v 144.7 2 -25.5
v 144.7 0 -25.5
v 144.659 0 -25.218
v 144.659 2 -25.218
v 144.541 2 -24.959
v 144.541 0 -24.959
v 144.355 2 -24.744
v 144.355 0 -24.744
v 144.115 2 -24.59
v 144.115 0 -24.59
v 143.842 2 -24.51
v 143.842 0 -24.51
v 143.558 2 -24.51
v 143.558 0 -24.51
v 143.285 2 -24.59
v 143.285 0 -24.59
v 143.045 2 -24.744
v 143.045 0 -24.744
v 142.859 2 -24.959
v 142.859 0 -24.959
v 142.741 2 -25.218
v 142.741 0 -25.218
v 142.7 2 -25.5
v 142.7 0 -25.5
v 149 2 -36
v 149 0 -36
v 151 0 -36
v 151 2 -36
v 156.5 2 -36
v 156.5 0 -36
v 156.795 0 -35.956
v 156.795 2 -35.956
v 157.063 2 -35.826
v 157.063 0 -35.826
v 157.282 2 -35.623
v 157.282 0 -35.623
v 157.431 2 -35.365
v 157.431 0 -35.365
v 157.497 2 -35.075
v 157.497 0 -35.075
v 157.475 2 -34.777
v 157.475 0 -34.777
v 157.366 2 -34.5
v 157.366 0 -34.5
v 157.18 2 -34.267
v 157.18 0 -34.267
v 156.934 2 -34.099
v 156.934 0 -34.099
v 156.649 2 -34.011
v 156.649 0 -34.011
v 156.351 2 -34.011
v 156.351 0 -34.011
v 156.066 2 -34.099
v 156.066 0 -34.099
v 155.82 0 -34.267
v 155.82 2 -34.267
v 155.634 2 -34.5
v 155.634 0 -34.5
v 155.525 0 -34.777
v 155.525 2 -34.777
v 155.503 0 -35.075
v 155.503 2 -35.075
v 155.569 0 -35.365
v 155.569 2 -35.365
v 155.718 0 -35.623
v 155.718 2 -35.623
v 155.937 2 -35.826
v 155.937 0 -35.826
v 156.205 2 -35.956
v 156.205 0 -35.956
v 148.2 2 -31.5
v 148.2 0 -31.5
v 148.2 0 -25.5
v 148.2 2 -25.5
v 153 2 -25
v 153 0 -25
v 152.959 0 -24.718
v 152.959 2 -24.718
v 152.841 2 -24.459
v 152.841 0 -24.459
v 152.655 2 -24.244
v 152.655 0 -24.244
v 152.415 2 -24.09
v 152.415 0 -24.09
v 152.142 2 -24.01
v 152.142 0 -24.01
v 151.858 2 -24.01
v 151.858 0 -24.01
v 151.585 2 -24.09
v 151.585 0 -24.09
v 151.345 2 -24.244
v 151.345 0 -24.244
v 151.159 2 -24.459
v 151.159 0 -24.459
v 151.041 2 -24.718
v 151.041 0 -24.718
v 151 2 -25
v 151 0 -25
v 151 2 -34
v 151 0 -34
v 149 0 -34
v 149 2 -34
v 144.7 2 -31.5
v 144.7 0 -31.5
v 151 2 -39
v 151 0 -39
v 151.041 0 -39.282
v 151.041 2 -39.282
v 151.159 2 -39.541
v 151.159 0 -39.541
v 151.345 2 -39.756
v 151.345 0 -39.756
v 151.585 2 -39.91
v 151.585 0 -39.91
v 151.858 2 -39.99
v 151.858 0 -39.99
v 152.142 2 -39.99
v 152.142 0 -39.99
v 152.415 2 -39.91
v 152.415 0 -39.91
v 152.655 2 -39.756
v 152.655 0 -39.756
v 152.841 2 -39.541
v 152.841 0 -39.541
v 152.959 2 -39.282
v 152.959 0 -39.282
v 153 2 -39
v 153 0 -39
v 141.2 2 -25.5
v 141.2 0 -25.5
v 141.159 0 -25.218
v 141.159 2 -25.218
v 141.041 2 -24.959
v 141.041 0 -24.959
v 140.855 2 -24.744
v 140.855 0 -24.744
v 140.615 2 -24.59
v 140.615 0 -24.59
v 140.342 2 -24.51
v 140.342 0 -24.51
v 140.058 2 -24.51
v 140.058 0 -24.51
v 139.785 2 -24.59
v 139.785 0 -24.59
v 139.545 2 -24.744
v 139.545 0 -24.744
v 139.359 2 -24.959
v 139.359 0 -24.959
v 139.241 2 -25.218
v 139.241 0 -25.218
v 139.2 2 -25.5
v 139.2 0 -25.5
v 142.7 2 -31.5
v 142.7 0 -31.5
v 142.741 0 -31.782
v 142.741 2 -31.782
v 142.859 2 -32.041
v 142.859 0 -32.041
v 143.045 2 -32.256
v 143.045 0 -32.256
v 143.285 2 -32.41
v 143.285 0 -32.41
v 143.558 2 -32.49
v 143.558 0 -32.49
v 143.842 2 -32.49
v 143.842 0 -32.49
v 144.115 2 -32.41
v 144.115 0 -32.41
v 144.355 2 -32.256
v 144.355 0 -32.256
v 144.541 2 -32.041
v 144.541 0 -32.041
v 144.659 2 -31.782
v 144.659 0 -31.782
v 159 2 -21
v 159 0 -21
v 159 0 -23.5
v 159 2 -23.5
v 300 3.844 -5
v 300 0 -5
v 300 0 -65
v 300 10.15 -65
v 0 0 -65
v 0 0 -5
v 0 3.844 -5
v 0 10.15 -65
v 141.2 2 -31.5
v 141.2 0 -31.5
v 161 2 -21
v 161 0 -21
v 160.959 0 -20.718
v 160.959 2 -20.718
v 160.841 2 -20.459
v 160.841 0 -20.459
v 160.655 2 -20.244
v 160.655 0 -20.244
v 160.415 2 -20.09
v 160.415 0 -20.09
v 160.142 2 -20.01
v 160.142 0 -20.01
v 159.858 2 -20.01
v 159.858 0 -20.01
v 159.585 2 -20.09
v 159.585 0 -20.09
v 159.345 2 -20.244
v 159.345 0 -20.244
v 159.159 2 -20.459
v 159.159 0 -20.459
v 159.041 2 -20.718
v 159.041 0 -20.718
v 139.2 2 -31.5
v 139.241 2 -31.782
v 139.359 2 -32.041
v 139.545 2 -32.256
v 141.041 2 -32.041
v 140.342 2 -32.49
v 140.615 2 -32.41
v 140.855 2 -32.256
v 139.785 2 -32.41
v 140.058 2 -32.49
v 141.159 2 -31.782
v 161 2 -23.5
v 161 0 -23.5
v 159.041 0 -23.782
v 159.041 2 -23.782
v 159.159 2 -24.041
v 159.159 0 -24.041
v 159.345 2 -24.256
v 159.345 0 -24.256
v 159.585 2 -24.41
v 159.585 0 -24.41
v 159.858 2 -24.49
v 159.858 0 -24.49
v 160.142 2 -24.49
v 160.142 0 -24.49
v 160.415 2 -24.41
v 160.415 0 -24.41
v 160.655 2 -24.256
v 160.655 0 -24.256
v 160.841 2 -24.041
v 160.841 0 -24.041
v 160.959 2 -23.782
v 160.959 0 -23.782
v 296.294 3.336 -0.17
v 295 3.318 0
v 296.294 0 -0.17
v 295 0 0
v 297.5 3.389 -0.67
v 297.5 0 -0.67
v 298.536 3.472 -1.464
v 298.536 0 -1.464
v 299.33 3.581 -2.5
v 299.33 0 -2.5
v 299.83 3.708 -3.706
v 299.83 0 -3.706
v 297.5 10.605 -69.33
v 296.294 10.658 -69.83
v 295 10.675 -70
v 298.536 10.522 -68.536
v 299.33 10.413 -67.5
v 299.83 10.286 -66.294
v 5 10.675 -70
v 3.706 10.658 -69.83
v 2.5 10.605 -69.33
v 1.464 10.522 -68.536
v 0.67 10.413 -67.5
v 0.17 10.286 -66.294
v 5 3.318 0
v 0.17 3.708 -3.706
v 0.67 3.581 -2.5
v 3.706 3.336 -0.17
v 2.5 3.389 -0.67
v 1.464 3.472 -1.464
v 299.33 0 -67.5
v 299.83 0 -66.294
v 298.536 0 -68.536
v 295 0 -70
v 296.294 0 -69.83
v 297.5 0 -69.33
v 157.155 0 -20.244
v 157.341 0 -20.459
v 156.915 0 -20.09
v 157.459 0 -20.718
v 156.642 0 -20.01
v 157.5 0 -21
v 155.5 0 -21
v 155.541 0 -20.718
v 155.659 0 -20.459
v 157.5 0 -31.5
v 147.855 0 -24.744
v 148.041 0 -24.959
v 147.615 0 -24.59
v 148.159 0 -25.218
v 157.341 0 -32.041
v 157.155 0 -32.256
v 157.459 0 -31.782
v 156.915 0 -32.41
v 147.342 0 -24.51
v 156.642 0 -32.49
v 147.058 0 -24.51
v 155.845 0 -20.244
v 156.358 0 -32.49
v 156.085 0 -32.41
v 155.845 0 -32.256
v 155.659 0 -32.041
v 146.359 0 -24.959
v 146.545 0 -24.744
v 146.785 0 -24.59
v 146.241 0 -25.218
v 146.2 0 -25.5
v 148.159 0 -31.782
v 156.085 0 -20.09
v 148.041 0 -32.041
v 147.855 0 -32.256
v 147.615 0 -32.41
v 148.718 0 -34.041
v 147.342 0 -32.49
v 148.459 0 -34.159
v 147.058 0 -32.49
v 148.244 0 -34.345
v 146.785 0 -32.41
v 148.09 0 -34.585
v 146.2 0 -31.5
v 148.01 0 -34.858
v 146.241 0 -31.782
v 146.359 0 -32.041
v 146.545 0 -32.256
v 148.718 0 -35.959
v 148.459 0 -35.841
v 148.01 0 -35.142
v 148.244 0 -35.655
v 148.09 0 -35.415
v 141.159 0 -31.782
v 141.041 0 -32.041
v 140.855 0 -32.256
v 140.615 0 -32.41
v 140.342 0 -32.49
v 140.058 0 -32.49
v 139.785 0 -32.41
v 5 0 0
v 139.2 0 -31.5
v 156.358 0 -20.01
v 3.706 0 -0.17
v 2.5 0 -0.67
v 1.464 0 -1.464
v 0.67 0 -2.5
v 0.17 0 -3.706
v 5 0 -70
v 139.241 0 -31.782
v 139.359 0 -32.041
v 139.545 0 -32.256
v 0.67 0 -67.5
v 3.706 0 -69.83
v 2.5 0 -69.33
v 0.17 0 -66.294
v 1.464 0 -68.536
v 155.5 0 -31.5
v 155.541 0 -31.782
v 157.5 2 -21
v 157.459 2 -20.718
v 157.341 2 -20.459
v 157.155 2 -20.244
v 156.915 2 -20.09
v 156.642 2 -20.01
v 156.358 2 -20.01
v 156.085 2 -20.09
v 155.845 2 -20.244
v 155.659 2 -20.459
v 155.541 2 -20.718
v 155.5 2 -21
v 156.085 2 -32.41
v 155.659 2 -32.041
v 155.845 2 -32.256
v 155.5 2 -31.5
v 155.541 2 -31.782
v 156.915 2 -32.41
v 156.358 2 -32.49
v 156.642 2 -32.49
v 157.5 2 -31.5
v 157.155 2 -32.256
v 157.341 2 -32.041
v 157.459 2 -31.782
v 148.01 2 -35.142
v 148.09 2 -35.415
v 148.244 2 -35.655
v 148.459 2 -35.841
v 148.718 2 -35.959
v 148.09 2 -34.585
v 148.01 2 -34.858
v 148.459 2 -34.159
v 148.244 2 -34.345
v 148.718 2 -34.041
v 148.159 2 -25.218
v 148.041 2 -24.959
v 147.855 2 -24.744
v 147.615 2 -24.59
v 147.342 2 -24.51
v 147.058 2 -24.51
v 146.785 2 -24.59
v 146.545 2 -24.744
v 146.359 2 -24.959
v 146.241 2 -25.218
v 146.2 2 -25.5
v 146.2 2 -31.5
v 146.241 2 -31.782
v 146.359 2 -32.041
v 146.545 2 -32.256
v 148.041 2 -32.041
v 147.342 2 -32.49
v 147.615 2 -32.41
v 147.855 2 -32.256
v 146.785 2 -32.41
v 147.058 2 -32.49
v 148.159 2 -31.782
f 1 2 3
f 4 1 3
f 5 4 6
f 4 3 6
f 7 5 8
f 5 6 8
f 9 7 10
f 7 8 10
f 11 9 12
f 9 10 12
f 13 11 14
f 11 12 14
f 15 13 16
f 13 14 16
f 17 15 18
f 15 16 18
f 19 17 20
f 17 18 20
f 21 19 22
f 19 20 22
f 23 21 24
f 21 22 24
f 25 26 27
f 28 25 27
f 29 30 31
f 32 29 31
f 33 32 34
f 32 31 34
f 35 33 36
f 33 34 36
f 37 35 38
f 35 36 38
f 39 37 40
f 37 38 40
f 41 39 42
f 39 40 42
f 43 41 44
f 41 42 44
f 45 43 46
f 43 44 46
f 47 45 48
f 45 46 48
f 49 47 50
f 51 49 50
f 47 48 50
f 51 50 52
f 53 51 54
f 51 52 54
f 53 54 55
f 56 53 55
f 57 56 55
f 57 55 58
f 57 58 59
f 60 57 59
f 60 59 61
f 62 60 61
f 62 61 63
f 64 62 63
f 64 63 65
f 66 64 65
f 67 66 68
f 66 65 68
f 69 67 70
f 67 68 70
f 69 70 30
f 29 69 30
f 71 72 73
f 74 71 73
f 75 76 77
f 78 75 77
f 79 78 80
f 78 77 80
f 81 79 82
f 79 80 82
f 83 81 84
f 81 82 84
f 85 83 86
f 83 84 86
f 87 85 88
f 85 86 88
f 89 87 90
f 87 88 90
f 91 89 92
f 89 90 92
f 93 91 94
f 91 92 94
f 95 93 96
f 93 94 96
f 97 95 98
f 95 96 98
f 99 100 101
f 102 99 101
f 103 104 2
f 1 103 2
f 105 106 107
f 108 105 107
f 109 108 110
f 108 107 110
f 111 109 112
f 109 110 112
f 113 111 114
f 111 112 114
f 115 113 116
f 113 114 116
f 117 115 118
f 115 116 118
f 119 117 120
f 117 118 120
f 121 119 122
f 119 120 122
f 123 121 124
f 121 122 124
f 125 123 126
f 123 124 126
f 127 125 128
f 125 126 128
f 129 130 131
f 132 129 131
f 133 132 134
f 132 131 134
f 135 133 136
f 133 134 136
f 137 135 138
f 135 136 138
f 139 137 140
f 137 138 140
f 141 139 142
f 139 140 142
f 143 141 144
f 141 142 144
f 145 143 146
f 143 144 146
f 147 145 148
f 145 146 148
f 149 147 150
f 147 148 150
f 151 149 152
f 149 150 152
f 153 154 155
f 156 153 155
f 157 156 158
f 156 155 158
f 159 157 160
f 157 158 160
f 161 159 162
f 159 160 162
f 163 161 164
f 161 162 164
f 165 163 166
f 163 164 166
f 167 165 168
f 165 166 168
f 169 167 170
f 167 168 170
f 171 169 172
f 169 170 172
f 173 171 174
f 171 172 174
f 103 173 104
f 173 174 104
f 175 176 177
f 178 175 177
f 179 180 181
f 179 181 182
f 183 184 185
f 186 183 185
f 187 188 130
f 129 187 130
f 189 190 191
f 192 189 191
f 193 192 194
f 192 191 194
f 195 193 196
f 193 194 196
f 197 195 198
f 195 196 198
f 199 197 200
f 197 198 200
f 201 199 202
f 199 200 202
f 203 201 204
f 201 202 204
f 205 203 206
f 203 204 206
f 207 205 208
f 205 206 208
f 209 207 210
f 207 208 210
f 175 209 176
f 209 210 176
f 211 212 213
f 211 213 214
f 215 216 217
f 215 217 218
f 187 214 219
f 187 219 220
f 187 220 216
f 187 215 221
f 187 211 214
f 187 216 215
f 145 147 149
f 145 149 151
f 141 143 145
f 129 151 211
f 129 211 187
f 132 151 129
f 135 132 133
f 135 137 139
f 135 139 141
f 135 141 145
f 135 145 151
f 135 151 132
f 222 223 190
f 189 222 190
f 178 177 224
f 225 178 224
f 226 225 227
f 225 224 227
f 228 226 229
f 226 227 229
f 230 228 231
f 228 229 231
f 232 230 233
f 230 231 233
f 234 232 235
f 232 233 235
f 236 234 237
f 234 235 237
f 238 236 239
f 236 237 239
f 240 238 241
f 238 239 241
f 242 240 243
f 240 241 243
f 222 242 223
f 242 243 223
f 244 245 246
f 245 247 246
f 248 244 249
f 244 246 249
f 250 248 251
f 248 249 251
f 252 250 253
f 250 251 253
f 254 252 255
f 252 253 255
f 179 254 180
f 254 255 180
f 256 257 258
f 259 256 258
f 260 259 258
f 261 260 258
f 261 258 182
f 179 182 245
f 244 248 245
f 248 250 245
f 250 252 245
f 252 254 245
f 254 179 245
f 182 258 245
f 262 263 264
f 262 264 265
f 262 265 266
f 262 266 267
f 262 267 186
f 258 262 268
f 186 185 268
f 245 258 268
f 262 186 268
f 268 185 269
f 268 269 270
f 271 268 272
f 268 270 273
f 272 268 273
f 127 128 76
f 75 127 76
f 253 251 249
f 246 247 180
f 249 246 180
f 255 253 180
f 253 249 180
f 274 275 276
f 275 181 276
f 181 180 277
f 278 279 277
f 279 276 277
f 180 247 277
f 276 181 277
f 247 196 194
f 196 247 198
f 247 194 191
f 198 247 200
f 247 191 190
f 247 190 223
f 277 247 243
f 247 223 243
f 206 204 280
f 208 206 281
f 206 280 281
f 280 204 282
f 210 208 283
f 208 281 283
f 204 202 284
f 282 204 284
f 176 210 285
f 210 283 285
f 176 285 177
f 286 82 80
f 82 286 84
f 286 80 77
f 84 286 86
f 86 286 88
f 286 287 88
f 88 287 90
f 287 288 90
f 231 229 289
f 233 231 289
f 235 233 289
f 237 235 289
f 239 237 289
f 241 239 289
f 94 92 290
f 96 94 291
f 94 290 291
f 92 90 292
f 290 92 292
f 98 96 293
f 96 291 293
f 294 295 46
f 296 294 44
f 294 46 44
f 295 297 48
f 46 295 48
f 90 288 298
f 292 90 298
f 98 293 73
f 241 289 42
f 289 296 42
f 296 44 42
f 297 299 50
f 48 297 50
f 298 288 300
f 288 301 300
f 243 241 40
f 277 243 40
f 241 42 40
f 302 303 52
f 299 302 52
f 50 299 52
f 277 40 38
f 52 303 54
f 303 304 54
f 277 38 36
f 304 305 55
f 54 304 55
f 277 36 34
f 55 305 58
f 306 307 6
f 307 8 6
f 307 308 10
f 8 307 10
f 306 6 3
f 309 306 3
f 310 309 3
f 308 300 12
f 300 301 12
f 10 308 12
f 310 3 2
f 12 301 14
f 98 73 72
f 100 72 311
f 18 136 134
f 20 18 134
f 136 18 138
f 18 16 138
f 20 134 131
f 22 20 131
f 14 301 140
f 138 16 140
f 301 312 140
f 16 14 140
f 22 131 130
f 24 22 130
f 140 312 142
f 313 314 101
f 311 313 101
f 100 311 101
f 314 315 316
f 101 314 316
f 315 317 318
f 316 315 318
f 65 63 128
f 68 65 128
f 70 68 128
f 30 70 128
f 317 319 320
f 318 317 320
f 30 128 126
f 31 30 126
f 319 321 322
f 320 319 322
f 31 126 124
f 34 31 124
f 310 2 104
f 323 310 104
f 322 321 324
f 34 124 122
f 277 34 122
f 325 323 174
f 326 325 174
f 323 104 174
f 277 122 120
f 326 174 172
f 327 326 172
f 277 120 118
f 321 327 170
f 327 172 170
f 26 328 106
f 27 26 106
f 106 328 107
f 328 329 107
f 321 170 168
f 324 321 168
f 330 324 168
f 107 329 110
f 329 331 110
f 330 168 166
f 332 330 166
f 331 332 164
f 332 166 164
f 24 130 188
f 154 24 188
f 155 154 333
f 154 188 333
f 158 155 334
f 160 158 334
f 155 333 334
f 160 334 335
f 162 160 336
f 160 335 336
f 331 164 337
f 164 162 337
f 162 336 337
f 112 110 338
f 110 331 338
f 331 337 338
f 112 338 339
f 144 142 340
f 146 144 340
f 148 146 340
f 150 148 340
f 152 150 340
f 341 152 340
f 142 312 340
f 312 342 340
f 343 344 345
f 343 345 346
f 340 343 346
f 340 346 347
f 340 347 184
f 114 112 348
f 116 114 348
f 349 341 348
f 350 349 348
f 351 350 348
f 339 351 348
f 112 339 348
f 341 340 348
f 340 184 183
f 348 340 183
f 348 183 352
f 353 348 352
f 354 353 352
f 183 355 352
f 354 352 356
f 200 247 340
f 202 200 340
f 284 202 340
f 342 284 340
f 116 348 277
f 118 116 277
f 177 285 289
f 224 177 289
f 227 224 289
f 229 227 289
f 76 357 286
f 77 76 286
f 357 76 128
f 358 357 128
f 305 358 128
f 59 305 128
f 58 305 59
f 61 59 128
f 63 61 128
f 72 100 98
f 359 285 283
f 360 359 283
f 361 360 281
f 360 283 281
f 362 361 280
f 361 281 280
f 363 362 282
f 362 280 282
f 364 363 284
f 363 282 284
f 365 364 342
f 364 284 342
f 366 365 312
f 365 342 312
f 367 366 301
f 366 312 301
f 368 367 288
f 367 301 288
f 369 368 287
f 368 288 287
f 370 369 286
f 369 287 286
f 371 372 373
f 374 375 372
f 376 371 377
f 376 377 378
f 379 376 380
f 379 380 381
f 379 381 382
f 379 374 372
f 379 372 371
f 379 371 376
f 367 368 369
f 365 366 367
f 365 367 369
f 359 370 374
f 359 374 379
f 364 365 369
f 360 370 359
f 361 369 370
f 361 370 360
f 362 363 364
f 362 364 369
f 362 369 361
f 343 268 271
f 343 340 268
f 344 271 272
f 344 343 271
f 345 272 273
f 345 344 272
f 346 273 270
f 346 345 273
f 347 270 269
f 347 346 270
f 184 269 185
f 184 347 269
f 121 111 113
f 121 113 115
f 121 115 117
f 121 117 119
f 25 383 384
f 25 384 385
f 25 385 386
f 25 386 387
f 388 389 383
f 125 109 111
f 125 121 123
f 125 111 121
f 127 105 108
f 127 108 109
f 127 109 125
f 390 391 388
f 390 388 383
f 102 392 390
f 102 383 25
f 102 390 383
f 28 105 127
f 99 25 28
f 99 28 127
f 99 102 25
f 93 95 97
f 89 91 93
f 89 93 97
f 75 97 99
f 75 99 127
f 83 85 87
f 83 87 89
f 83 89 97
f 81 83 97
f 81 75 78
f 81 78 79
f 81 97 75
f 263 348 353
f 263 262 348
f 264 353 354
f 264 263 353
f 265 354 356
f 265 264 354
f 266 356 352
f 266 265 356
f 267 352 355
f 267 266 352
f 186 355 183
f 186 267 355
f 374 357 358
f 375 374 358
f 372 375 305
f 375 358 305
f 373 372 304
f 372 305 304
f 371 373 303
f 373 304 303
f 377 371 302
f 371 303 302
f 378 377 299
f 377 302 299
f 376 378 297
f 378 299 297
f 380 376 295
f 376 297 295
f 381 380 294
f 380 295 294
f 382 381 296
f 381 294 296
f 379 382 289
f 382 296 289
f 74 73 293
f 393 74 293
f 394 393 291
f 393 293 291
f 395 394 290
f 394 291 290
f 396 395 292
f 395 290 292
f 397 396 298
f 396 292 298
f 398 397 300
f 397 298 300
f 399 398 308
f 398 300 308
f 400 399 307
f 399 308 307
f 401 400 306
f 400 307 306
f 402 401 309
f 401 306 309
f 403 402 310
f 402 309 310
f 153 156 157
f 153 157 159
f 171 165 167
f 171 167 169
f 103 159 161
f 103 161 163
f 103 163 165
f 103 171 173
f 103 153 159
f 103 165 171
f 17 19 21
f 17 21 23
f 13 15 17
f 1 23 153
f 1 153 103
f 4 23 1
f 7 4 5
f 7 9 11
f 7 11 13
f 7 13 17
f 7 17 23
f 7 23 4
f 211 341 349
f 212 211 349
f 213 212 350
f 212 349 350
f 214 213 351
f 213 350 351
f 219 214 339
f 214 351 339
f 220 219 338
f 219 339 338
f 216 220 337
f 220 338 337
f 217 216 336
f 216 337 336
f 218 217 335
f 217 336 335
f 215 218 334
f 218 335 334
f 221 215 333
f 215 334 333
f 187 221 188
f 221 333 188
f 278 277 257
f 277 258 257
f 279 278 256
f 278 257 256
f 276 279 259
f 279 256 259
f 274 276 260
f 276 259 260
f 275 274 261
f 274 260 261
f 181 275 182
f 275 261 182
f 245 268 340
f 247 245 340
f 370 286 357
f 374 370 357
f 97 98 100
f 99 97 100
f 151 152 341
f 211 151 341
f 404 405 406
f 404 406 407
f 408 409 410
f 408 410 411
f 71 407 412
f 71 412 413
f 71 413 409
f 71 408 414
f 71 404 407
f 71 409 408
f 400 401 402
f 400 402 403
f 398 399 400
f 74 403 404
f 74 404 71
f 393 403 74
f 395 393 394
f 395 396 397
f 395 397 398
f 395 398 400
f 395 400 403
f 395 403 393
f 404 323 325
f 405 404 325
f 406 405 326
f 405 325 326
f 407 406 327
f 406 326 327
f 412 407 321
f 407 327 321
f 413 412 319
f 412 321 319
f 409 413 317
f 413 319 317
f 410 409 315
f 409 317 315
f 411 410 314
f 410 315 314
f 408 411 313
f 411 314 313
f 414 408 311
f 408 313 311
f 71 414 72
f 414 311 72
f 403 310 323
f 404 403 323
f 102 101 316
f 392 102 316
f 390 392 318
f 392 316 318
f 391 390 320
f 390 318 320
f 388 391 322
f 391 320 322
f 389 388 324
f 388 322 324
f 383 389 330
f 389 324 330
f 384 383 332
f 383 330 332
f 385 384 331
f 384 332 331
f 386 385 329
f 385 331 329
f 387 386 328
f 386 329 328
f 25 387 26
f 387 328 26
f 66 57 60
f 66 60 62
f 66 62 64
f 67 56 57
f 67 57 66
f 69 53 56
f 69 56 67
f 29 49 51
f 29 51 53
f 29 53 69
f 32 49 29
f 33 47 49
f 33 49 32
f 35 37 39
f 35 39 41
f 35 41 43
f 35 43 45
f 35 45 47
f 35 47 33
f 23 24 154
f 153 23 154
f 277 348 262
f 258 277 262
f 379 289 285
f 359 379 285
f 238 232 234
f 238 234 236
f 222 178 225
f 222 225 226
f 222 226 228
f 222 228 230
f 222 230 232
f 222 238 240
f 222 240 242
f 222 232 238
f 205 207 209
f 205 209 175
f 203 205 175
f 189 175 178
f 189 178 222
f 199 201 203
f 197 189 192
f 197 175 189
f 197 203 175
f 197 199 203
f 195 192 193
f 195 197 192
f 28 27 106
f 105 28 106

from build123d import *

# Parameters (mm, degrees)
BOSS_EXTRUDE1_REACH = 317.752
SKETCH1_W           = 300
SKETCH1_H           = 70
FILLET1_R           = 5
SKETCH2_R           = 1
CUT_EXTRUDE3_DEPTH  = 2


with BuildPart() as part:
    # Boss-Extrude1: up to this plane
    boss_extrude1_end = Plane(origin=(0, 3.281922255, 0.344943929), z_dir=(0, 0.9945218953682733, 0.10452846326765369))
    # Sketch1 → Boss-Extrude1 (new, up to the surface)
    with BuildSketch(Plane(origin=(0, 0, 0), x_dir=(1, 0, 0), z_dir=(0, 1, 0)), mode=Mode.PRIVATE) as boss_extrude1_sk1:
        with Locations((150, 35)):
            Rectangle(SKETCH1_W, SKETCH1_H)
    boss_extrude1_tool1 = split(extrude(boss_extrude1_sk1.sketch, amount=BOSS_EXTRUDE1_REACH, mode=Mode.PRIVATE), bisect_by=boss_extrude1_end, keep=Keep.BOTH, mode=Mode.PRIVATE)
    add(boss_extrude1_tool1.solids().sort_by_distance((150, 0, -35))[0])

    # Fillet1
    fillet1_edges = [part.edges().sort_by_distance(p)[0] for p in [
        (300, 5.337736896, -70),
        (300, 1.659088661, 0),
        (0, 1.659088661, 0),
        (0, 5.337736896, -70),
    ]]
    fillet(fillet1_edges, radius=FILLET1_R)

    # Sketch2 → Cut-Extrude3 (cut)
    with BuildSketch(Plane.XZ):
        with BuildLine():
            ThreePointArc((151, -39), (152, -40), (153, -39))
            Line((153, -39), (153, -25))
            ThreePointArc((153, -25), (152, -24), (151, -25))
            Line((151, -25), (151, -34))
            Line((151, -34), (149, -34))
            ThreePointArc((149, -34), (148, -35), (149, -36))
            Line((149, -36), (151, -36))
            Line((151, -36), (151, -39))
        make_face()
        with BuildLine():
            ThreePointArc((155.5, -31.5), (156.5, -32.5), (157.5, -31.5))
            Line((157.5, -31.5), (157.5, -21))
            ThreePointArc((157.5, -21), (156.5, -20), (155.5, -21))
            Line((155.5, -21), (155.5, -31.5))
        make_face()
        with BuildLine():
            ThreePointArc((146.2, -31.5), (147.2, -32.5), (148.2, -31.5))
            Line((148.2, -31.5), (148.2, -25.5))
            ThreePointArc((148.2, -25.5), (147.2, -24.5), (146.2, -25.5))
            Line((146.2, -25.5), (146.2, -31.5))
        make_face()
        with BuildLine():
            ThreePointArc((142.7, -31.5), (143.7, -32.5), (144.7, -31.5))
            Line((144.7, -31.5), (144.7, -25.5))
            ThreePointArc((144.7, -25.5), (143.7, -24.5), (142.7, -25.5))
            Line((142.7, -25.5), (142.7, -31.5))
        make_face()
        with BuildLine():
            ThreePointArc((139.2, -31.5), (140.2, -32.5), (141.2, -31.5))
            Line((141.2, -31.5), (141.2, -25.5))
            ThreePointArc((141.2, -25.5), (140.2, -24.5), (139.2, -25.5))
            Line((139.2, -25.5), (139.2, -31.5))
        make_face()
        with BuildLine():
            ThreePointArc((159, -23.5), (160, -24.5), (161, -23.5))
            Line((161, -23.5), (161, -21))
            ThreePointArc((161, -21), (160, -20), (159, -21))
            Line((159, -21), (159, -23.5))
        make_face()
        with Locations((156.5, -35)):
            Circle(SKETCH2_R)
    extrude(amount=-CUT_EXTRUDE3_DEPTH, mode=Mode.SUBTRACT)


solid = part.part
